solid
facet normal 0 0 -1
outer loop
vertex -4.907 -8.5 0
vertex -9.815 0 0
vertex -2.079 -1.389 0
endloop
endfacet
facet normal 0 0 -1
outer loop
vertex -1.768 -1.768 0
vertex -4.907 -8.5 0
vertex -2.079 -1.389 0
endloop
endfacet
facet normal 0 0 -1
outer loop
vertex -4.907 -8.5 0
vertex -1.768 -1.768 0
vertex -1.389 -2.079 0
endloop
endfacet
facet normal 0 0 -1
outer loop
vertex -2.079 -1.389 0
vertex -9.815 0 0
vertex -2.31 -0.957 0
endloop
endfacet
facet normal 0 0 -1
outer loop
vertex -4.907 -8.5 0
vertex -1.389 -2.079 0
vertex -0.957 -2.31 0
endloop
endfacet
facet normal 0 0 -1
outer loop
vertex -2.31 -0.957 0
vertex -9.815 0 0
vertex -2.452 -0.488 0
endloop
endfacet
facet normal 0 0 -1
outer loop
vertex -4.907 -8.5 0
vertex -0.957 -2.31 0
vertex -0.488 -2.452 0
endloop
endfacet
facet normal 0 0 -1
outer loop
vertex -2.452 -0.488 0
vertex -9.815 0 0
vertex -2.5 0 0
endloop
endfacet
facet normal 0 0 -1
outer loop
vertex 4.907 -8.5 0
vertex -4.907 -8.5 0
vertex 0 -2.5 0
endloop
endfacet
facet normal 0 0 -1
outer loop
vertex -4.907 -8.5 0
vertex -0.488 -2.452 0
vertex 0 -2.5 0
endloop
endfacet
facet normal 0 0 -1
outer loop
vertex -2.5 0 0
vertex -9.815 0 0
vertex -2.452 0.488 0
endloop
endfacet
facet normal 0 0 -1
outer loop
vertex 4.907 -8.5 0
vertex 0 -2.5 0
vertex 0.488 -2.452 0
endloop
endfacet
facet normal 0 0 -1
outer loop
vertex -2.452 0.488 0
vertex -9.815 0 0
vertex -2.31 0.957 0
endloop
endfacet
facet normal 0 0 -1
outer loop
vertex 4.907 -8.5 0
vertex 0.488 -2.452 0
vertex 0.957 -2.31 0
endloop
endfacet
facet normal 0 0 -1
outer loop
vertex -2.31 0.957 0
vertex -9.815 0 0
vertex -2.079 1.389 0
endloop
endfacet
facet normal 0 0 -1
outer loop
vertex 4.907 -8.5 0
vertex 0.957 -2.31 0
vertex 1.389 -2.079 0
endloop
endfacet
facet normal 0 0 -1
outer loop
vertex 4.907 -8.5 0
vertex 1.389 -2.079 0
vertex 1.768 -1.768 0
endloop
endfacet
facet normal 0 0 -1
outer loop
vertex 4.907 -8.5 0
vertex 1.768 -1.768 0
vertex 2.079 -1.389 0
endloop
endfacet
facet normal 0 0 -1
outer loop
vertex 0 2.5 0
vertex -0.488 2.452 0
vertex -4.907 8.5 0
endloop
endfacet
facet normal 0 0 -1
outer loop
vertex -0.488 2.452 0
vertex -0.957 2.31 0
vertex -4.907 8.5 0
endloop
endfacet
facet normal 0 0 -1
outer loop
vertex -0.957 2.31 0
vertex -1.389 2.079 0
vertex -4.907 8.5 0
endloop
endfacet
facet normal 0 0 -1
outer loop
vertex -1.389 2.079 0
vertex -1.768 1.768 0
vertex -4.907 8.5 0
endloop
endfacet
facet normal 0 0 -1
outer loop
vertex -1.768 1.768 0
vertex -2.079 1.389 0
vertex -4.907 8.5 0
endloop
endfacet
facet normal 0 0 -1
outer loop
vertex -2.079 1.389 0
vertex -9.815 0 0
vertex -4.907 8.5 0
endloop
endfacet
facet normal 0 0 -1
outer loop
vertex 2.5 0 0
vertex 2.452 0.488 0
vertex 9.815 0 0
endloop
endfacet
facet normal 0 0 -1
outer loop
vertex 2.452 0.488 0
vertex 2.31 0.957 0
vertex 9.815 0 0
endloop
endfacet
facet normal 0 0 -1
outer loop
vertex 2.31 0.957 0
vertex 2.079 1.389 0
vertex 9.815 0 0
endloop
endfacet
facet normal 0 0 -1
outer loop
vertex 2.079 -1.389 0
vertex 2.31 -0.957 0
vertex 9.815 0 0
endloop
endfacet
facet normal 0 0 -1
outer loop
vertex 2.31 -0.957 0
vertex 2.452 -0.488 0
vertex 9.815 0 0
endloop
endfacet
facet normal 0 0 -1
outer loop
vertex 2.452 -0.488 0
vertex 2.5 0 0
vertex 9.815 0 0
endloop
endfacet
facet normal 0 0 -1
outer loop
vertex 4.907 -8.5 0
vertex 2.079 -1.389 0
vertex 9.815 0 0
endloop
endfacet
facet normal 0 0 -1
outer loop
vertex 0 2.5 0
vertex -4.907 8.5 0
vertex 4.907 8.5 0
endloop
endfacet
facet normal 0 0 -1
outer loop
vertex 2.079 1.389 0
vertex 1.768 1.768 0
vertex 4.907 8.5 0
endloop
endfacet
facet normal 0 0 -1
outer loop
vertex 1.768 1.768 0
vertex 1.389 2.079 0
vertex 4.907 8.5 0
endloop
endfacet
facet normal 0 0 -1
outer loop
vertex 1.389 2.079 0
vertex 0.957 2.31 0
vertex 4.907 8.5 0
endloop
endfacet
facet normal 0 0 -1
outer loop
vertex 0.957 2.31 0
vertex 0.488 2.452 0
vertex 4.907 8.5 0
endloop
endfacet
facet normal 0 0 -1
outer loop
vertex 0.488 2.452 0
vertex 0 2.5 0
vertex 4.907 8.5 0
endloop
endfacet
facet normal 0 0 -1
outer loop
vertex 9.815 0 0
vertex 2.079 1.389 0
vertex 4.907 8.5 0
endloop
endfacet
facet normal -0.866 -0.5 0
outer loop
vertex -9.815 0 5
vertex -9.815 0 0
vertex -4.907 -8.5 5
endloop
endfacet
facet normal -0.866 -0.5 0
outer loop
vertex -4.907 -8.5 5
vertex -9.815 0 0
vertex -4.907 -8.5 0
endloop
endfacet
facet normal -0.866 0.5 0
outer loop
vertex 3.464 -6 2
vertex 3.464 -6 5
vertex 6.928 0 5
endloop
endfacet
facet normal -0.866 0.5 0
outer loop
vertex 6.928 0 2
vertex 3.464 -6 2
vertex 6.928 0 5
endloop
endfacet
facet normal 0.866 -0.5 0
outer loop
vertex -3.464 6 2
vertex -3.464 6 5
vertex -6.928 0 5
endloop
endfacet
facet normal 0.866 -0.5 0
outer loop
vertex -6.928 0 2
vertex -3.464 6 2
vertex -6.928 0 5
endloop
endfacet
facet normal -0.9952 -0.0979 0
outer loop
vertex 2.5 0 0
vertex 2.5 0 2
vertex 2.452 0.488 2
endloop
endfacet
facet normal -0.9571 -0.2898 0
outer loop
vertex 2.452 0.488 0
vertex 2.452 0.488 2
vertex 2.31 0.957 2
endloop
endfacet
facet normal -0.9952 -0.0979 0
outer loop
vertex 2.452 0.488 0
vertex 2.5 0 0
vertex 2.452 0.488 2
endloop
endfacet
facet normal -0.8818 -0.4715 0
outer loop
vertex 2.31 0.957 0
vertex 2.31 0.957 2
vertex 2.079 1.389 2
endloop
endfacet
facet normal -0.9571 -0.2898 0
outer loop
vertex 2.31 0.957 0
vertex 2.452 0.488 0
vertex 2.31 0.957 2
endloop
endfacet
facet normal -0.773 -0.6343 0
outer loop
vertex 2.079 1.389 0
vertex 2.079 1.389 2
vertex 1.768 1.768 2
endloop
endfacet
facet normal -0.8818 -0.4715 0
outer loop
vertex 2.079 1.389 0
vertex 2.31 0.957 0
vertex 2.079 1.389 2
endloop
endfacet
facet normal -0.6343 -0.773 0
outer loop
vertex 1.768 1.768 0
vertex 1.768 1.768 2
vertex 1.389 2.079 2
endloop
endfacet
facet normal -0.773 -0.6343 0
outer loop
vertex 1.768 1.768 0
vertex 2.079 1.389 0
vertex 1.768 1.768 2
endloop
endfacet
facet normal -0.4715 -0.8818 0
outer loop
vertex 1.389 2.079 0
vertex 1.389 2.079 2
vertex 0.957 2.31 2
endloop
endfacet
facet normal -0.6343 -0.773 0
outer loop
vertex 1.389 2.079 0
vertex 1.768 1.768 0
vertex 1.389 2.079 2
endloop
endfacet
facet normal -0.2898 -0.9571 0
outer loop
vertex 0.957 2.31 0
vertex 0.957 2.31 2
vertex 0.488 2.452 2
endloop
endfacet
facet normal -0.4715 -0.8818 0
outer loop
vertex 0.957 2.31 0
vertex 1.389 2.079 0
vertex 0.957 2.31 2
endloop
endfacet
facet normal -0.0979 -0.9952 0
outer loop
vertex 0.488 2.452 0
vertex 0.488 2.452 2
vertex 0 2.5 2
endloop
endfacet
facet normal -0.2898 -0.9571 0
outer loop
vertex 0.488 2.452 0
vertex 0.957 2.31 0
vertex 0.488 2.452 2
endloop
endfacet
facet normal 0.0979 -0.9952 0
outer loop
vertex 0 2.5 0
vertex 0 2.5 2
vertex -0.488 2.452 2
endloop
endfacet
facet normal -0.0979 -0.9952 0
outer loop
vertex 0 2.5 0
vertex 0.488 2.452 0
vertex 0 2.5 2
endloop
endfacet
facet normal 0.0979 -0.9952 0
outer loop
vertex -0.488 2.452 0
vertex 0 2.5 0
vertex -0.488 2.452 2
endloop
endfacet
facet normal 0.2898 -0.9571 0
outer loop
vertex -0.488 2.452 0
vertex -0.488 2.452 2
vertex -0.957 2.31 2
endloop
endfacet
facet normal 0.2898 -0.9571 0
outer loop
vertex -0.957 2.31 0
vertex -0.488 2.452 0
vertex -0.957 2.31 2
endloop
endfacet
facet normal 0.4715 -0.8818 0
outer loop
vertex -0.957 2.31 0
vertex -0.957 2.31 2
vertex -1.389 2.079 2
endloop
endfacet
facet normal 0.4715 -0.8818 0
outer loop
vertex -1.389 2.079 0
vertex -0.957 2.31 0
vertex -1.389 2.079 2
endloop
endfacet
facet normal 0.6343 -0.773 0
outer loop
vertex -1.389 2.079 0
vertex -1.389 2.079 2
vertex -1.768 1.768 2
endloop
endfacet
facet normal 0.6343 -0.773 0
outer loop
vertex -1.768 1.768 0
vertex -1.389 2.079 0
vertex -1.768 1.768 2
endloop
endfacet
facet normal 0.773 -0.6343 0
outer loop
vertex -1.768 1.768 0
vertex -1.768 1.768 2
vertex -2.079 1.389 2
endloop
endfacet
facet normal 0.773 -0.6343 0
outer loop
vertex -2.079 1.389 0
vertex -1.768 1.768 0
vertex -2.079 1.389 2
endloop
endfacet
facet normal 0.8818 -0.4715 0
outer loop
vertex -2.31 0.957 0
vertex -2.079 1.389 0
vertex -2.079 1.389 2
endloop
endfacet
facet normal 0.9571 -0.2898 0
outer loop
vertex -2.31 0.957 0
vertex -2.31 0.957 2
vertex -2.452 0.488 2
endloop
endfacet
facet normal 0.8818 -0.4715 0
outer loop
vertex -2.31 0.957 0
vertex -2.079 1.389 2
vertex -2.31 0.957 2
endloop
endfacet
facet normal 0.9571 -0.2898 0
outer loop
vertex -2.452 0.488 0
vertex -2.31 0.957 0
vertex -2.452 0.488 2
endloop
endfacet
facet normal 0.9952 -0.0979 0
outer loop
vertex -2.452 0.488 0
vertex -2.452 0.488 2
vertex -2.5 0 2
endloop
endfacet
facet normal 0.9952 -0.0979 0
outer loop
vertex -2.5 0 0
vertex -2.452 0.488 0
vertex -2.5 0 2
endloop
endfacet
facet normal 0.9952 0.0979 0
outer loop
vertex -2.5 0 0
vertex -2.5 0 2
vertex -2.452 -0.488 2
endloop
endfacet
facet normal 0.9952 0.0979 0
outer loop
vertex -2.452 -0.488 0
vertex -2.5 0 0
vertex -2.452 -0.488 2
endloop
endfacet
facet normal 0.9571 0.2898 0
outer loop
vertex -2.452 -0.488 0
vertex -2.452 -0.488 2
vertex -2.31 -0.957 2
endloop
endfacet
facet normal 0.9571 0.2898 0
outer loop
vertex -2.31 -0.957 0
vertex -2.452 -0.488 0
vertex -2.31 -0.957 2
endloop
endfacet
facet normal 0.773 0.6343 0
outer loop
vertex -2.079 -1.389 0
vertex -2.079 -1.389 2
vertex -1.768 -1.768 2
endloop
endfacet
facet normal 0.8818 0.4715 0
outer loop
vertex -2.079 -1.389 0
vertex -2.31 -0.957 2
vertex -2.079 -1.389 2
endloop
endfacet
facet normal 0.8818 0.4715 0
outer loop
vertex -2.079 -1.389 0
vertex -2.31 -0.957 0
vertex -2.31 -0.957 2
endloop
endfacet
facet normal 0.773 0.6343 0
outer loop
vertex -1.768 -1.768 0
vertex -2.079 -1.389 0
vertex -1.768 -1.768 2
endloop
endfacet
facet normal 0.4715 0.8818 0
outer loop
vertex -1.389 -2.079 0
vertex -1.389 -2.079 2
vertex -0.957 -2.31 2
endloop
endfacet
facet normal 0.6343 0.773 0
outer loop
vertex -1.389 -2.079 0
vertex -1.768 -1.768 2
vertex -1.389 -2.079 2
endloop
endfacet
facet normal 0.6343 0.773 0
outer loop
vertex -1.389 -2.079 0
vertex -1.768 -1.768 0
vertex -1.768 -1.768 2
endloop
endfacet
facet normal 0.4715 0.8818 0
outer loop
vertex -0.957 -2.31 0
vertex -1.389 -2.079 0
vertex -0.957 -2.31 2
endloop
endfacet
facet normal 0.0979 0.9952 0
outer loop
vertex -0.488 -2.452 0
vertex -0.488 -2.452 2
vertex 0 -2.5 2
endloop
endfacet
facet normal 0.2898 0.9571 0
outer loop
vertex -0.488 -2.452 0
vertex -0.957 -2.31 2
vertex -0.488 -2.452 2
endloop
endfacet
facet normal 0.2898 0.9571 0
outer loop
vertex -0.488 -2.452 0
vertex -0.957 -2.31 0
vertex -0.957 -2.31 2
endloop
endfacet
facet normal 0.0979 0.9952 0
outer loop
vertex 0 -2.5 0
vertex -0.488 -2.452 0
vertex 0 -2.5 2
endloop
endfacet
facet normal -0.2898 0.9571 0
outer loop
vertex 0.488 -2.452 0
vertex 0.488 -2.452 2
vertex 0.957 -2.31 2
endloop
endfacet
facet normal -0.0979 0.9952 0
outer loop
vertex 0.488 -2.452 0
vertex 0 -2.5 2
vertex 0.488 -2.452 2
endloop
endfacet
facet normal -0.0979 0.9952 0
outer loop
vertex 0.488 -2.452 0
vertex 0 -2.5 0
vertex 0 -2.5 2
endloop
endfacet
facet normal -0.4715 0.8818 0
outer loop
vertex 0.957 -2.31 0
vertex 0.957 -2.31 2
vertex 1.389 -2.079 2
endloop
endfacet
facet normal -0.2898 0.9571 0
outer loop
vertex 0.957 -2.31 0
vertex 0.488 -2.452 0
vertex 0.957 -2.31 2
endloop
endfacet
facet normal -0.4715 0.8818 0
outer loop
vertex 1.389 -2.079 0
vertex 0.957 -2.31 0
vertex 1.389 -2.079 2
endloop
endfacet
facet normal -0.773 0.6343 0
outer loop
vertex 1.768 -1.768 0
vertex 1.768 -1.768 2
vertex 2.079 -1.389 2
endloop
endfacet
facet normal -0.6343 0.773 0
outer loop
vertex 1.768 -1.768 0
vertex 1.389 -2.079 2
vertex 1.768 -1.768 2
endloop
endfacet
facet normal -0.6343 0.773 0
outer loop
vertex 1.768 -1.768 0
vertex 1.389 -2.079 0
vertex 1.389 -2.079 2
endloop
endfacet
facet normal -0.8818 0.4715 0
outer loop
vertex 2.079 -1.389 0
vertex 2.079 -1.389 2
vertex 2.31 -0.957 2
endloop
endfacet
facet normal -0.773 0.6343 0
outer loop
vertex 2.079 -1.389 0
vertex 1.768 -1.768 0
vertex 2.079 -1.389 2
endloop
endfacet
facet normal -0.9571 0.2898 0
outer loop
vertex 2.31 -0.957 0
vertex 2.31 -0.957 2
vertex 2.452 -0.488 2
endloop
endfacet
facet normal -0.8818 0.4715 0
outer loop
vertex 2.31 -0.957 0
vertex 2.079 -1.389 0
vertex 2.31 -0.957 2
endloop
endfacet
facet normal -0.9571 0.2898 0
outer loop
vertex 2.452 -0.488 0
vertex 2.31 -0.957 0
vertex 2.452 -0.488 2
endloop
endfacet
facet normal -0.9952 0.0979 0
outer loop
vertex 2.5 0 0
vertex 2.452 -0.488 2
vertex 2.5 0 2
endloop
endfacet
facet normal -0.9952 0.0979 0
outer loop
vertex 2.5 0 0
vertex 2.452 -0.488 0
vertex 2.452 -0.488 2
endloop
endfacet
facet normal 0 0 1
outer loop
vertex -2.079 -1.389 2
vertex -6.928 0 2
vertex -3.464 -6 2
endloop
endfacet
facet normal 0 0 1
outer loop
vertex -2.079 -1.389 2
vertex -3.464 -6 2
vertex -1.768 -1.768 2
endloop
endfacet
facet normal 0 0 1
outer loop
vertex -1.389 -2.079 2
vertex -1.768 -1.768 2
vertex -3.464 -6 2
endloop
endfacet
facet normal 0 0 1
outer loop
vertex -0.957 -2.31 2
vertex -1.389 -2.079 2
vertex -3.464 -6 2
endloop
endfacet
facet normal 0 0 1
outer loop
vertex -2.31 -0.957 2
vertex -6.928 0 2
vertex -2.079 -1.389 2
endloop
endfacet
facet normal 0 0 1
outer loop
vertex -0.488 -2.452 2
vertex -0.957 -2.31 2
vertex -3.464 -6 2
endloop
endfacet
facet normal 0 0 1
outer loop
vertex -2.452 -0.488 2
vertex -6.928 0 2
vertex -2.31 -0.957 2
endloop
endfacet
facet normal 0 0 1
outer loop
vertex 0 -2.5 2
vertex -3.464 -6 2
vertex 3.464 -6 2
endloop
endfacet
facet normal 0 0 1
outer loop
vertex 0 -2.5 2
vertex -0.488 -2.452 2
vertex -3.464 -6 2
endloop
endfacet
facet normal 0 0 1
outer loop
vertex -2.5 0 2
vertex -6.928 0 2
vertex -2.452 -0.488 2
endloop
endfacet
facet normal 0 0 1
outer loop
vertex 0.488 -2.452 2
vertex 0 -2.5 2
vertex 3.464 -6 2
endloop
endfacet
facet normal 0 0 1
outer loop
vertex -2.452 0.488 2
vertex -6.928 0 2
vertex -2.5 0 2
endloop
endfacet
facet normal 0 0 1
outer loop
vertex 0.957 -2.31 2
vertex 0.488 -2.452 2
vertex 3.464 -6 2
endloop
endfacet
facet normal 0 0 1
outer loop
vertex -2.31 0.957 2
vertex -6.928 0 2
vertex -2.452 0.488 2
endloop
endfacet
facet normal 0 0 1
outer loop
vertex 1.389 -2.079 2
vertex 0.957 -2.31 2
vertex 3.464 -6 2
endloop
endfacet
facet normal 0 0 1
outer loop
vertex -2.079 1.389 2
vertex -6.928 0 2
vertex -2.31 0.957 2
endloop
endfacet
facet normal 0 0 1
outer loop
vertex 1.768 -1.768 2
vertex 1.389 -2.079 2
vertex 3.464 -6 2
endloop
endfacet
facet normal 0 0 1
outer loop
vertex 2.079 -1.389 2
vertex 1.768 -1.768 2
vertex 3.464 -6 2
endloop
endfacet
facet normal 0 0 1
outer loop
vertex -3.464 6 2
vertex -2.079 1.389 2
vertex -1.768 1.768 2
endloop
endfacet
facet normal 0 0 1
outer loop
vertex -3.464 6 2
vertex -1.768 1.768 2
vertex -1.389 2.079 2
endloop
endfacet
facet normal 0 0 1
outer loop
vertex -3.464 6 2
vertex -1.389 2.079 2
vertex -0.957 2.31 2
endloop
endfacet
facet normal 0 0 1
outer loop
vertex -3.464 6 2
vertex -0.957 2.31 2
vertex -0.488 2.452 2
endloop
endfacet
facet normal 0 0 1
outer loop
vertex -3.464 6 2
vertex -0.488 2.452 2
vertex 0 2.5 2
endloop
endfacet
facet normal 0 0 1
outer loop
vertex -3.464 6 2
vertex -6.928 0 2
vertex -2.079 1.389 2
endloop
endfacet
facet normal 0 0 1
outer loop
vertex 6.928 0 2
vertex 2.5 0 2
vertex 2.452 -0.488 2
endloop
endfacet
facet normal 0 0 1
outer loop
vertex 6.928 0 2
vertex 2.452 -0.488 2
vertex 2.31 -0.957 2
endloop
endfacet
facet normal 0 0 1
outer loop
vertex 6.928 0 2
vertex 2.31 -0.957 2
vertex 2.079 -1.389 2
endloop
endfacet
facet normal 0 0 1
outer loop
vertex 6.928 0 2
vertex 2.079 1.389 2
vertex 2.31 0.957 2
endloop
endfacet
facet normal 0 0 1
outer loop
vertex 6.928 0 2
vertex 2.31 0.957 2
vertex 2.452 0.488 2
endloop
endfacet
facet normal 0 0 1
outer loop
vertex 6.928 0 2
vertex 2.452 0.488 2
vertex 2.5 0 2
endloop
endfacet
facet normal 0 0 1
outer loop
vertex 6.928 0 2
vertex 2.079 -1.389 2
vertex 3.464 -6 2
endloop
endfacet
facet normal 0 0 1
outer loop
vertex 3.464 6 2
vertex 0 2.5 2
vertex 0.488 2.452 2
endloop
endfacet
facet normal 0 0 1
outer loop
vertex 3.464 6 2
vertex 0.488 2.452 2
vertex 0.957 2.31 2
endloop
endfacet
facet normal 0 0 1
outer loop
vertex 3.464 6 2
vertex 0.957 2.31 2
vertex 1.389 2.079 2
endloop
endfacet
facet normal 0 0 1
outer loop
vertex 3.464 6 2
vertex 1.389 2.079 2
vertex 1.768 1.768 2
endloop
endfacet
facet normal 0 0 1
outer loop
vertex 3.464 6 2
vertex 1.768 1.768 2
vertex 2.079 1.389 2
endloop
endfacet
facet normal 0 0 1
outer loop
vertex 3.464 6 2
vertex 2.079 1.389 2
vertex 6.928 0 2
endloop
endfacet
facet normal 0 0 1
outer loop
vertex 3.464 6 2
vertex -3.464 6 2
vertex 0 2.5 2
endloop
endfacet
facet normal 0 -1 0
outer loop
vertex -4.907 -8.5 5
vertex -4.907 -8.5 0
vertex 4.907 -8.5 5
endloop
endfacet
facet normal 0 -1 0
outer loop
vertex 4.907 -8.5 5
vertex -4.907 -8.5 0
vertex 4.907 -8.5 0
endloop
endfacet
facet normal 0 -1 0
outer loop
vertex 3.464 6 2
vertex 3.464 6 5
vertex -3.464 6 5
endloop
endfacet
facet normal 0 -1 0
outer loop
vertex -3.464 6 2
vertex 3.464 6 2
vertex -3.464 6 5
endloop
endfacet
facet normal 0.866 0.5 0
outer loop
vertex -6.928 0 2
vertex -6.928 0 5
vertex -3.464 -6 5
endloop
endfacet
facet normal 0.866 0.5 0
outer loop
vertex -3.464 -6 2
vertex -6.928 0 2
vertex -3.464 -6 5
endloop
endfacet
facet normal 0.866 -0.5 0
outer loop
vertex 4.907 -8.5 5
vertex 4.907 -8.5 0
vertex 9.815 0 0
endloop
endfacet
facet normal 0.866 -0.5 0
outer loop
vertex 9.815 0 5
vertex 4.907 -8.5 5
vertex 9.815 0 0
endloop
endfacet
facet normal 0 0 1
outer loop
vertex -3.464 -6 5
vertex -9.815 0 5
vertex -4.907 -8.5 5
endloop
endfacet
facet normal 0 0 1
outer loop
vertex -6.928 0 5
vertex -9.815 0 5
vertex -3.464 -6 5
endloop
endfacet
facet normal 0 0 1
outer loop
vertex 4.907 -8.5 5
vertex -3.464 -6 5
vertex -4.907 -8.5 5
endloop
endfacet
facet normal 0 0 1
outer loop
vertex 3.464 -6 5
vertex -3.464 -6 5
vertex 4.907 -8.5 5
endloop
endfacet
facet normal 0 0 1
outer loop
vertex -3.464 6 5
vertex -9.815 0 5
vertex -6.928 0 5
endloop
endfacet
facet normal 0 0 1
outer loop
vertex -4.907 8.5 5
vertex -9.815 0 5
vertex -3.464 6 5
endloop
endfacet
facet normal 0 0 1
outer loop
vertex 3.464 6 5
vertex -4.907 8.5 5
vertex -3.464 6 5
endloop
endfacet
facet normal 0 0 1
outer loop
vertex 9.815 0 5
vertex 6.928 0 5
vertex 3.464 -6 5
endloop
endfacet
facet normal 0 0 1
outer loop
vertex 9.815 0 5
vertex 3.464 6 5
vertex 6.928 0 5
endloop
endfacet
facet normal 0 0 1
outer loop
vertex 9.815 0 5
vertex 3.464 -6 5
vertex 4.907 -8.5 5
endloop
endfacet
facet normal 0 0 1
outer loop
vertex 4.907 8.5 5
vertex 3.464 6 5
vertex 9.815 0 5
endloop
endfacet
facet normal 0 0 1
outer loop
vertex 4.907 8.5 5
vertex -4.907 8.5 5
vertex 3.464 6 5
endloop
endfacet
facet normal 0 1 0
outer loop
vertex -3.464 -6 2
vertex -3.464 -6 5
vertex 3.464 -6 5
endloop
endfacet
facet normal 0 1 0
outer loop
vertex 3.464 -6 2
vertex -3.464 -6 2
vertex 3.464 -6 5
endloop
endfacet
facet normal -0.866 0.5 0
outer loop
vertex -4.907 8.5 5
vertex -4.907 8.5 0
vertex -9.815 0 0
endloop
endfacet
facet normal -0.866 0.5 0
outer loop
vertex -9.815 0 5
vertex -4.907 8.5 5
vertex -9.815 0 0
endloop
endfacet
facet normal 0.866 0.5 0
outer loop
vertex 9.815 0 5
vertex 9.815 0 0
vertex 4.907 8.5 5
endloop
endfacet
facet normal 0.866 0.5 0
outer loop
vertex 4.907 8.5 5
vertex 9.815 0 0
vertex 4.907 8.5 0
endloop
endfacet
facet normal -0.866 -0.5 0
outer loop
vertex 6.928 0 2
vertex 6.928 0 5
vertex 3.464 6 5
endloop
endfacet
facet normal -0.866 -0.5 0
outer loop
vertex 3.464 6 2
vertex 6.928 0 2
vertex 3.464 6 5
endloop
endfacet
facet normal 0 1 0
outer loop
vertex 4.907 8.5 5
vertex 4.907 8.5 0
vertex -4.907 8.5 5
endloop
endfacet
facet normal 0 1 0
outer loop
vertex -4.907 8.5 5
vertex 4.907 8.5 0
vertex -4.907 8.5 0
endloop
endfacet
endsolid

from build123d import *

# Parameters (mm, degrees)
SKETCH1_R           = 2.5
BOSS_EXTRUDE1_DEPTH = 5
CUT_EXTRUDE1_DEPTH  = 3


with BuildPart() as part:
    # Sketch1 → Boss-Extrude1 (new body)
    with BuildSketch(Plane.XY):
        Polygon((-9.814954576, 0), (-4.907477288, -8.5), (4.907477288, -8.5), (9.814954576, 0), (4.907477288, 8.5), (-4.907477288, 8.5), align=None)
        Circle(SKETCH1_R, mode=Mode.SUBTRACT)
    extrude(amount=BOSS_EXTRUDE1_DEPTH)

    # Sketch2 → Cut-Extrude1 (cut)
    with BuildSketch(Plane.XY.offset(5)):
        Polygon((3.464101615, -6), (6.92820323, 0), (3.464101615, 6), (-3.464101615, 6), (-6.92820323, 0), (-3.464101615, -6), align=None)
    extrude(amount=-CUT_EXTRUDE1_DEPTH, mode=Mode.SUBTRACT)


solid = part.part
